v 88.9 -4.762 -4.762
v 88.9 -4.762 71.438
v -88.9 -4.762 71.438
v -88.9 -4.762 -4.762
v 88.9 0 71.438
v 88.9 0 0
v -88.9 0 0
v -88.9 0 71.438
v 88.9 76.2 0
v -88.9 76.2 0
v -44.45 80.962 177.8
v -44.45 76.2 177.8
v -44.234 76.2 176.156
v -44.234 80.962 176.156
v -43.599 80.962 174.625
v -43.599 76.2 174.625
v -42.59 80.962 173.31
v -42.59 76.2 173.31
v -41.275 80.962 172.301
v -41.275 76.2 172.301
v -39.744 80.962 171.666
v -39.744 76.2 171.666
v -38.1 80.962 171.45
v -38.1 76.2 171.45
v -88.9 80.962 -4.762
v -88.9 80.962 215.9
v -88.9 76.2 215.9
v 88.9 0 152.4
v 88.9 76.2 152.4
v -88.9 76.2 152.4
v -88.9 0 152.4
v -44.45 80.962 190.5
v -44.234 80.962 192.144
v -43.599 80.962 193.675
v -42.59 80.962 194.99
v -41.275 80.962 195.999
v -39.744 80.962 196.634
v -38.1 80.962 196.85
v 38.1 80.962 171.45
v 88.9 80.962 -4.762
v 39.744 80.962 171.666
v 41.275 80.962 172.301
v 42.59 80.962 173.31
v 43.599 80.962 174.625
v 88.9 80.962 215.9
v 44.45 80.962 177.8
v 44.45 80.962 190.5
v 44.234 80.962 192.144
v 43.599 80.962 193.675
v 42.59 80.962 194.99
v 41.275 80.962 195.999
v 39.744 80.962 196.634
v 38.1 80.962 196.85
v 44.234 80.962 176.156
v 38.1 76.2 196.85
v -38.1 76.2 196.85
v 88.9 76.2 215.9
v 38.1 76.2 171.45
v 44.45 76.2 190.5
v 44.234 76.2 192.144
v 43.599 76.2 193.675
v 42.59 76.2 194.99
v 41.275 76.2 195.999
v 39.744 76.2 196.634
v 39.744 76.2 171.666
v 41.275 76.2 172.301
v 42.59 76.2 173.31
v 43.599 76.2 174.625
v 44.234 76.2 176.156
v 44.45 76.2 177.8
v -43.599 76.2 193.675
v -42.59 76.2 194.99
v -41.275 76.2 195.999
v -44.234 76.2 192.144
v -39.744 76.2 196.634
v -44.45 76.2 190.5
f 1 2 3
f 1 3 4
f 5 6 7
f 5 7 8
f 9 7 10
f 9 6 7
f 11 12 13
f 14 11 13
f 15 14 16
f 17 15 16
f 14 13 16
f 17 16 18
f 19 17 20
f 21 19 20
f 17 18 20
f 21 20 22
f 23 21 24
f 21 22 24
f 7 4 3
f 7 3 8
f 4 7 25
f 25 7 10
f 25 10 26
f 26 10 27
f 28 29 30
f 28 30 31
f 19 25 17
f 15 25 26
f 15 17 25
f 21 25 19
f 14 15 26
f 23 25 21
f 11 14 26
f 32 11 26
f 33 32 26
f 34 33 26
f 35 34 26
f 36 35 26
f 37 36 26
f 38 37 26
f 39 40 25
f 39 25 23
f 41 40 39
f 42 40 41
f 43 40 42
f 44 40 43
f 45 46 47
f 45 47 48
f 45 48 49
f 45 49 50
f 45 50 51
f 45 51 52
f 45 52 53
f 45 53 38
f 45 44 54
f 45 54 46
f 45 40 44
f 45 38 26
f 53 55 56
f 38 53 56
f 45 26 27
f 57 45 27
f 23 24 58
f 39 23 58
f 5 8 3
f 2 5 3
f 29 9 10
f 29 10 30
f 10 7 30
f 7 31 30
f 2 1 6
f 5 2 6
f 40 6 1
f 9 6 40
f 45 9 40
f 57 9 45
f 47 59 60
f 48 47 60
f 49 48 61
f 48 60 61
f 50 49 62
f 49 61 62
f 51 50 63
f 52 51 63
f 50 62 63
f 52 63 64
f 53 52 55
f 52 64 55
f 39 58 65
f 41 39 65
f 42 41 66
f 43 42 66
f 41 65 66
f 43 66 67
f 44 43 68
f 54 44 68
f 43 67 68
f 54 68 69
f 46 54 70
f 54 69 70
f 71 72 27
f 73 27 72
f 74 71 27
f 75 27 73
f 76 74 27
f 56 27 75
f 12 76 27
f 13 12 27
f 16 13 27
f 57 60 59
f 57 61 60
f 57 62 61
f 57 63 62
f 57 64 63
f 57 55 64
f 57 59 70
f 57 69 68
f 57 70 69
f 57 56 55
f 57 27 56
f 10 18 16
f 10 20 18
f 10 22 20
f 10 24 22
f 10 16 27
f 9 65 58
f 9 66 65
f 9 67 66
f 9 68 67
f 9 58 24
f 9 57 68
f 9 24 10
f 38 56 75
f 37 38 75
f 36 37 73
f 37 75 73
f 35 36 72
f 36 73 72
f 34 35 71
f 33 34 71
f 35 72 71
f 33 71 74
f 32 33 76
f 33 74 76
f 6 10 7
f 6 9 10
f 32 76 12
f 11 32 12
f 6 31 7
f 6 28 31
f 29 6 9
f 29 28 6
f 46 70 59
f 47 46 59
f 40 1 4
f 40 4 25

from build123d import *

# Parameters (mm, degrees)
F1_DEPTH      = 88.9
F1_DEPTH_BACK = 88.9
F2_DEPTH      = 88.9
F2_DEPTH_BACK = 88.9
F4_DEPTH      = 25.4


with BuildPart() as f1:
    # F0 (on Right) → F1 (new body, two sides)
    with BuildSketch(Plane.YZ) as f1_sk:
        Polygon((0, 71.4375), (0, 0), (76.2, 0), (76.2, 152.4), (0, 152.4), align=None)
    extrude(amount=F1_DEPTH)
    extrude(f1_sk.sketch, amount=-F1_DEPTH_BACK)


with BuildPart() as f2:
    # F0 (on Right) → F2 (new body, two sides)
    with BuildSketch(Plane.YZ) as f2_sk:
        Polygon((76.2, 0), (0, 0), (0, 71.4375), (-4.7625, 71.4375), (-4.7625, -4.7625), (80.9625, -4.7625), (80.9625, 215.9), (76.2, 215.9), (76.2, 152.4), align=None)
    extrude(amount=F2_DEPTH)
    extrude(f2_sk.sketch, amount=-F2_DEPTH_BACK)

    # F3 (on face) → F4 (cut)
    with BuildSketch(Plane.XZ.offset(-76.2)):
        with BuildLine():
            ThreePointArc((44.45, 190.5), (42.590128, 194.990128), (38.1, 196.85))
            Line((38.1, 196.85), (-38.1, 196.85))
            ThreePointArc((-38.1, 196.85), (-42.590128, 194.990128), (-44.45, 190.5))
            Line((-44.45, 190.5), (-44.45, 177.8))
            ThreePointArc((-44.45, 177.8), (-42.590128, 173.309872), (-38.1, 171.45))
            Line((-38.1, 171.45), (38.1, 171.45))
            ThreePointArc((38.1, 171.45), (42.590128, 173.309872), (44.45, 177.8))
            Line((44.45, 177.8), (44.45, 190.5))
        make_face()
    extrude(amount=-F4_DEPTH, mode=Mode.SUBTRACT)


solid = Compound([f1.part, f2.part])
